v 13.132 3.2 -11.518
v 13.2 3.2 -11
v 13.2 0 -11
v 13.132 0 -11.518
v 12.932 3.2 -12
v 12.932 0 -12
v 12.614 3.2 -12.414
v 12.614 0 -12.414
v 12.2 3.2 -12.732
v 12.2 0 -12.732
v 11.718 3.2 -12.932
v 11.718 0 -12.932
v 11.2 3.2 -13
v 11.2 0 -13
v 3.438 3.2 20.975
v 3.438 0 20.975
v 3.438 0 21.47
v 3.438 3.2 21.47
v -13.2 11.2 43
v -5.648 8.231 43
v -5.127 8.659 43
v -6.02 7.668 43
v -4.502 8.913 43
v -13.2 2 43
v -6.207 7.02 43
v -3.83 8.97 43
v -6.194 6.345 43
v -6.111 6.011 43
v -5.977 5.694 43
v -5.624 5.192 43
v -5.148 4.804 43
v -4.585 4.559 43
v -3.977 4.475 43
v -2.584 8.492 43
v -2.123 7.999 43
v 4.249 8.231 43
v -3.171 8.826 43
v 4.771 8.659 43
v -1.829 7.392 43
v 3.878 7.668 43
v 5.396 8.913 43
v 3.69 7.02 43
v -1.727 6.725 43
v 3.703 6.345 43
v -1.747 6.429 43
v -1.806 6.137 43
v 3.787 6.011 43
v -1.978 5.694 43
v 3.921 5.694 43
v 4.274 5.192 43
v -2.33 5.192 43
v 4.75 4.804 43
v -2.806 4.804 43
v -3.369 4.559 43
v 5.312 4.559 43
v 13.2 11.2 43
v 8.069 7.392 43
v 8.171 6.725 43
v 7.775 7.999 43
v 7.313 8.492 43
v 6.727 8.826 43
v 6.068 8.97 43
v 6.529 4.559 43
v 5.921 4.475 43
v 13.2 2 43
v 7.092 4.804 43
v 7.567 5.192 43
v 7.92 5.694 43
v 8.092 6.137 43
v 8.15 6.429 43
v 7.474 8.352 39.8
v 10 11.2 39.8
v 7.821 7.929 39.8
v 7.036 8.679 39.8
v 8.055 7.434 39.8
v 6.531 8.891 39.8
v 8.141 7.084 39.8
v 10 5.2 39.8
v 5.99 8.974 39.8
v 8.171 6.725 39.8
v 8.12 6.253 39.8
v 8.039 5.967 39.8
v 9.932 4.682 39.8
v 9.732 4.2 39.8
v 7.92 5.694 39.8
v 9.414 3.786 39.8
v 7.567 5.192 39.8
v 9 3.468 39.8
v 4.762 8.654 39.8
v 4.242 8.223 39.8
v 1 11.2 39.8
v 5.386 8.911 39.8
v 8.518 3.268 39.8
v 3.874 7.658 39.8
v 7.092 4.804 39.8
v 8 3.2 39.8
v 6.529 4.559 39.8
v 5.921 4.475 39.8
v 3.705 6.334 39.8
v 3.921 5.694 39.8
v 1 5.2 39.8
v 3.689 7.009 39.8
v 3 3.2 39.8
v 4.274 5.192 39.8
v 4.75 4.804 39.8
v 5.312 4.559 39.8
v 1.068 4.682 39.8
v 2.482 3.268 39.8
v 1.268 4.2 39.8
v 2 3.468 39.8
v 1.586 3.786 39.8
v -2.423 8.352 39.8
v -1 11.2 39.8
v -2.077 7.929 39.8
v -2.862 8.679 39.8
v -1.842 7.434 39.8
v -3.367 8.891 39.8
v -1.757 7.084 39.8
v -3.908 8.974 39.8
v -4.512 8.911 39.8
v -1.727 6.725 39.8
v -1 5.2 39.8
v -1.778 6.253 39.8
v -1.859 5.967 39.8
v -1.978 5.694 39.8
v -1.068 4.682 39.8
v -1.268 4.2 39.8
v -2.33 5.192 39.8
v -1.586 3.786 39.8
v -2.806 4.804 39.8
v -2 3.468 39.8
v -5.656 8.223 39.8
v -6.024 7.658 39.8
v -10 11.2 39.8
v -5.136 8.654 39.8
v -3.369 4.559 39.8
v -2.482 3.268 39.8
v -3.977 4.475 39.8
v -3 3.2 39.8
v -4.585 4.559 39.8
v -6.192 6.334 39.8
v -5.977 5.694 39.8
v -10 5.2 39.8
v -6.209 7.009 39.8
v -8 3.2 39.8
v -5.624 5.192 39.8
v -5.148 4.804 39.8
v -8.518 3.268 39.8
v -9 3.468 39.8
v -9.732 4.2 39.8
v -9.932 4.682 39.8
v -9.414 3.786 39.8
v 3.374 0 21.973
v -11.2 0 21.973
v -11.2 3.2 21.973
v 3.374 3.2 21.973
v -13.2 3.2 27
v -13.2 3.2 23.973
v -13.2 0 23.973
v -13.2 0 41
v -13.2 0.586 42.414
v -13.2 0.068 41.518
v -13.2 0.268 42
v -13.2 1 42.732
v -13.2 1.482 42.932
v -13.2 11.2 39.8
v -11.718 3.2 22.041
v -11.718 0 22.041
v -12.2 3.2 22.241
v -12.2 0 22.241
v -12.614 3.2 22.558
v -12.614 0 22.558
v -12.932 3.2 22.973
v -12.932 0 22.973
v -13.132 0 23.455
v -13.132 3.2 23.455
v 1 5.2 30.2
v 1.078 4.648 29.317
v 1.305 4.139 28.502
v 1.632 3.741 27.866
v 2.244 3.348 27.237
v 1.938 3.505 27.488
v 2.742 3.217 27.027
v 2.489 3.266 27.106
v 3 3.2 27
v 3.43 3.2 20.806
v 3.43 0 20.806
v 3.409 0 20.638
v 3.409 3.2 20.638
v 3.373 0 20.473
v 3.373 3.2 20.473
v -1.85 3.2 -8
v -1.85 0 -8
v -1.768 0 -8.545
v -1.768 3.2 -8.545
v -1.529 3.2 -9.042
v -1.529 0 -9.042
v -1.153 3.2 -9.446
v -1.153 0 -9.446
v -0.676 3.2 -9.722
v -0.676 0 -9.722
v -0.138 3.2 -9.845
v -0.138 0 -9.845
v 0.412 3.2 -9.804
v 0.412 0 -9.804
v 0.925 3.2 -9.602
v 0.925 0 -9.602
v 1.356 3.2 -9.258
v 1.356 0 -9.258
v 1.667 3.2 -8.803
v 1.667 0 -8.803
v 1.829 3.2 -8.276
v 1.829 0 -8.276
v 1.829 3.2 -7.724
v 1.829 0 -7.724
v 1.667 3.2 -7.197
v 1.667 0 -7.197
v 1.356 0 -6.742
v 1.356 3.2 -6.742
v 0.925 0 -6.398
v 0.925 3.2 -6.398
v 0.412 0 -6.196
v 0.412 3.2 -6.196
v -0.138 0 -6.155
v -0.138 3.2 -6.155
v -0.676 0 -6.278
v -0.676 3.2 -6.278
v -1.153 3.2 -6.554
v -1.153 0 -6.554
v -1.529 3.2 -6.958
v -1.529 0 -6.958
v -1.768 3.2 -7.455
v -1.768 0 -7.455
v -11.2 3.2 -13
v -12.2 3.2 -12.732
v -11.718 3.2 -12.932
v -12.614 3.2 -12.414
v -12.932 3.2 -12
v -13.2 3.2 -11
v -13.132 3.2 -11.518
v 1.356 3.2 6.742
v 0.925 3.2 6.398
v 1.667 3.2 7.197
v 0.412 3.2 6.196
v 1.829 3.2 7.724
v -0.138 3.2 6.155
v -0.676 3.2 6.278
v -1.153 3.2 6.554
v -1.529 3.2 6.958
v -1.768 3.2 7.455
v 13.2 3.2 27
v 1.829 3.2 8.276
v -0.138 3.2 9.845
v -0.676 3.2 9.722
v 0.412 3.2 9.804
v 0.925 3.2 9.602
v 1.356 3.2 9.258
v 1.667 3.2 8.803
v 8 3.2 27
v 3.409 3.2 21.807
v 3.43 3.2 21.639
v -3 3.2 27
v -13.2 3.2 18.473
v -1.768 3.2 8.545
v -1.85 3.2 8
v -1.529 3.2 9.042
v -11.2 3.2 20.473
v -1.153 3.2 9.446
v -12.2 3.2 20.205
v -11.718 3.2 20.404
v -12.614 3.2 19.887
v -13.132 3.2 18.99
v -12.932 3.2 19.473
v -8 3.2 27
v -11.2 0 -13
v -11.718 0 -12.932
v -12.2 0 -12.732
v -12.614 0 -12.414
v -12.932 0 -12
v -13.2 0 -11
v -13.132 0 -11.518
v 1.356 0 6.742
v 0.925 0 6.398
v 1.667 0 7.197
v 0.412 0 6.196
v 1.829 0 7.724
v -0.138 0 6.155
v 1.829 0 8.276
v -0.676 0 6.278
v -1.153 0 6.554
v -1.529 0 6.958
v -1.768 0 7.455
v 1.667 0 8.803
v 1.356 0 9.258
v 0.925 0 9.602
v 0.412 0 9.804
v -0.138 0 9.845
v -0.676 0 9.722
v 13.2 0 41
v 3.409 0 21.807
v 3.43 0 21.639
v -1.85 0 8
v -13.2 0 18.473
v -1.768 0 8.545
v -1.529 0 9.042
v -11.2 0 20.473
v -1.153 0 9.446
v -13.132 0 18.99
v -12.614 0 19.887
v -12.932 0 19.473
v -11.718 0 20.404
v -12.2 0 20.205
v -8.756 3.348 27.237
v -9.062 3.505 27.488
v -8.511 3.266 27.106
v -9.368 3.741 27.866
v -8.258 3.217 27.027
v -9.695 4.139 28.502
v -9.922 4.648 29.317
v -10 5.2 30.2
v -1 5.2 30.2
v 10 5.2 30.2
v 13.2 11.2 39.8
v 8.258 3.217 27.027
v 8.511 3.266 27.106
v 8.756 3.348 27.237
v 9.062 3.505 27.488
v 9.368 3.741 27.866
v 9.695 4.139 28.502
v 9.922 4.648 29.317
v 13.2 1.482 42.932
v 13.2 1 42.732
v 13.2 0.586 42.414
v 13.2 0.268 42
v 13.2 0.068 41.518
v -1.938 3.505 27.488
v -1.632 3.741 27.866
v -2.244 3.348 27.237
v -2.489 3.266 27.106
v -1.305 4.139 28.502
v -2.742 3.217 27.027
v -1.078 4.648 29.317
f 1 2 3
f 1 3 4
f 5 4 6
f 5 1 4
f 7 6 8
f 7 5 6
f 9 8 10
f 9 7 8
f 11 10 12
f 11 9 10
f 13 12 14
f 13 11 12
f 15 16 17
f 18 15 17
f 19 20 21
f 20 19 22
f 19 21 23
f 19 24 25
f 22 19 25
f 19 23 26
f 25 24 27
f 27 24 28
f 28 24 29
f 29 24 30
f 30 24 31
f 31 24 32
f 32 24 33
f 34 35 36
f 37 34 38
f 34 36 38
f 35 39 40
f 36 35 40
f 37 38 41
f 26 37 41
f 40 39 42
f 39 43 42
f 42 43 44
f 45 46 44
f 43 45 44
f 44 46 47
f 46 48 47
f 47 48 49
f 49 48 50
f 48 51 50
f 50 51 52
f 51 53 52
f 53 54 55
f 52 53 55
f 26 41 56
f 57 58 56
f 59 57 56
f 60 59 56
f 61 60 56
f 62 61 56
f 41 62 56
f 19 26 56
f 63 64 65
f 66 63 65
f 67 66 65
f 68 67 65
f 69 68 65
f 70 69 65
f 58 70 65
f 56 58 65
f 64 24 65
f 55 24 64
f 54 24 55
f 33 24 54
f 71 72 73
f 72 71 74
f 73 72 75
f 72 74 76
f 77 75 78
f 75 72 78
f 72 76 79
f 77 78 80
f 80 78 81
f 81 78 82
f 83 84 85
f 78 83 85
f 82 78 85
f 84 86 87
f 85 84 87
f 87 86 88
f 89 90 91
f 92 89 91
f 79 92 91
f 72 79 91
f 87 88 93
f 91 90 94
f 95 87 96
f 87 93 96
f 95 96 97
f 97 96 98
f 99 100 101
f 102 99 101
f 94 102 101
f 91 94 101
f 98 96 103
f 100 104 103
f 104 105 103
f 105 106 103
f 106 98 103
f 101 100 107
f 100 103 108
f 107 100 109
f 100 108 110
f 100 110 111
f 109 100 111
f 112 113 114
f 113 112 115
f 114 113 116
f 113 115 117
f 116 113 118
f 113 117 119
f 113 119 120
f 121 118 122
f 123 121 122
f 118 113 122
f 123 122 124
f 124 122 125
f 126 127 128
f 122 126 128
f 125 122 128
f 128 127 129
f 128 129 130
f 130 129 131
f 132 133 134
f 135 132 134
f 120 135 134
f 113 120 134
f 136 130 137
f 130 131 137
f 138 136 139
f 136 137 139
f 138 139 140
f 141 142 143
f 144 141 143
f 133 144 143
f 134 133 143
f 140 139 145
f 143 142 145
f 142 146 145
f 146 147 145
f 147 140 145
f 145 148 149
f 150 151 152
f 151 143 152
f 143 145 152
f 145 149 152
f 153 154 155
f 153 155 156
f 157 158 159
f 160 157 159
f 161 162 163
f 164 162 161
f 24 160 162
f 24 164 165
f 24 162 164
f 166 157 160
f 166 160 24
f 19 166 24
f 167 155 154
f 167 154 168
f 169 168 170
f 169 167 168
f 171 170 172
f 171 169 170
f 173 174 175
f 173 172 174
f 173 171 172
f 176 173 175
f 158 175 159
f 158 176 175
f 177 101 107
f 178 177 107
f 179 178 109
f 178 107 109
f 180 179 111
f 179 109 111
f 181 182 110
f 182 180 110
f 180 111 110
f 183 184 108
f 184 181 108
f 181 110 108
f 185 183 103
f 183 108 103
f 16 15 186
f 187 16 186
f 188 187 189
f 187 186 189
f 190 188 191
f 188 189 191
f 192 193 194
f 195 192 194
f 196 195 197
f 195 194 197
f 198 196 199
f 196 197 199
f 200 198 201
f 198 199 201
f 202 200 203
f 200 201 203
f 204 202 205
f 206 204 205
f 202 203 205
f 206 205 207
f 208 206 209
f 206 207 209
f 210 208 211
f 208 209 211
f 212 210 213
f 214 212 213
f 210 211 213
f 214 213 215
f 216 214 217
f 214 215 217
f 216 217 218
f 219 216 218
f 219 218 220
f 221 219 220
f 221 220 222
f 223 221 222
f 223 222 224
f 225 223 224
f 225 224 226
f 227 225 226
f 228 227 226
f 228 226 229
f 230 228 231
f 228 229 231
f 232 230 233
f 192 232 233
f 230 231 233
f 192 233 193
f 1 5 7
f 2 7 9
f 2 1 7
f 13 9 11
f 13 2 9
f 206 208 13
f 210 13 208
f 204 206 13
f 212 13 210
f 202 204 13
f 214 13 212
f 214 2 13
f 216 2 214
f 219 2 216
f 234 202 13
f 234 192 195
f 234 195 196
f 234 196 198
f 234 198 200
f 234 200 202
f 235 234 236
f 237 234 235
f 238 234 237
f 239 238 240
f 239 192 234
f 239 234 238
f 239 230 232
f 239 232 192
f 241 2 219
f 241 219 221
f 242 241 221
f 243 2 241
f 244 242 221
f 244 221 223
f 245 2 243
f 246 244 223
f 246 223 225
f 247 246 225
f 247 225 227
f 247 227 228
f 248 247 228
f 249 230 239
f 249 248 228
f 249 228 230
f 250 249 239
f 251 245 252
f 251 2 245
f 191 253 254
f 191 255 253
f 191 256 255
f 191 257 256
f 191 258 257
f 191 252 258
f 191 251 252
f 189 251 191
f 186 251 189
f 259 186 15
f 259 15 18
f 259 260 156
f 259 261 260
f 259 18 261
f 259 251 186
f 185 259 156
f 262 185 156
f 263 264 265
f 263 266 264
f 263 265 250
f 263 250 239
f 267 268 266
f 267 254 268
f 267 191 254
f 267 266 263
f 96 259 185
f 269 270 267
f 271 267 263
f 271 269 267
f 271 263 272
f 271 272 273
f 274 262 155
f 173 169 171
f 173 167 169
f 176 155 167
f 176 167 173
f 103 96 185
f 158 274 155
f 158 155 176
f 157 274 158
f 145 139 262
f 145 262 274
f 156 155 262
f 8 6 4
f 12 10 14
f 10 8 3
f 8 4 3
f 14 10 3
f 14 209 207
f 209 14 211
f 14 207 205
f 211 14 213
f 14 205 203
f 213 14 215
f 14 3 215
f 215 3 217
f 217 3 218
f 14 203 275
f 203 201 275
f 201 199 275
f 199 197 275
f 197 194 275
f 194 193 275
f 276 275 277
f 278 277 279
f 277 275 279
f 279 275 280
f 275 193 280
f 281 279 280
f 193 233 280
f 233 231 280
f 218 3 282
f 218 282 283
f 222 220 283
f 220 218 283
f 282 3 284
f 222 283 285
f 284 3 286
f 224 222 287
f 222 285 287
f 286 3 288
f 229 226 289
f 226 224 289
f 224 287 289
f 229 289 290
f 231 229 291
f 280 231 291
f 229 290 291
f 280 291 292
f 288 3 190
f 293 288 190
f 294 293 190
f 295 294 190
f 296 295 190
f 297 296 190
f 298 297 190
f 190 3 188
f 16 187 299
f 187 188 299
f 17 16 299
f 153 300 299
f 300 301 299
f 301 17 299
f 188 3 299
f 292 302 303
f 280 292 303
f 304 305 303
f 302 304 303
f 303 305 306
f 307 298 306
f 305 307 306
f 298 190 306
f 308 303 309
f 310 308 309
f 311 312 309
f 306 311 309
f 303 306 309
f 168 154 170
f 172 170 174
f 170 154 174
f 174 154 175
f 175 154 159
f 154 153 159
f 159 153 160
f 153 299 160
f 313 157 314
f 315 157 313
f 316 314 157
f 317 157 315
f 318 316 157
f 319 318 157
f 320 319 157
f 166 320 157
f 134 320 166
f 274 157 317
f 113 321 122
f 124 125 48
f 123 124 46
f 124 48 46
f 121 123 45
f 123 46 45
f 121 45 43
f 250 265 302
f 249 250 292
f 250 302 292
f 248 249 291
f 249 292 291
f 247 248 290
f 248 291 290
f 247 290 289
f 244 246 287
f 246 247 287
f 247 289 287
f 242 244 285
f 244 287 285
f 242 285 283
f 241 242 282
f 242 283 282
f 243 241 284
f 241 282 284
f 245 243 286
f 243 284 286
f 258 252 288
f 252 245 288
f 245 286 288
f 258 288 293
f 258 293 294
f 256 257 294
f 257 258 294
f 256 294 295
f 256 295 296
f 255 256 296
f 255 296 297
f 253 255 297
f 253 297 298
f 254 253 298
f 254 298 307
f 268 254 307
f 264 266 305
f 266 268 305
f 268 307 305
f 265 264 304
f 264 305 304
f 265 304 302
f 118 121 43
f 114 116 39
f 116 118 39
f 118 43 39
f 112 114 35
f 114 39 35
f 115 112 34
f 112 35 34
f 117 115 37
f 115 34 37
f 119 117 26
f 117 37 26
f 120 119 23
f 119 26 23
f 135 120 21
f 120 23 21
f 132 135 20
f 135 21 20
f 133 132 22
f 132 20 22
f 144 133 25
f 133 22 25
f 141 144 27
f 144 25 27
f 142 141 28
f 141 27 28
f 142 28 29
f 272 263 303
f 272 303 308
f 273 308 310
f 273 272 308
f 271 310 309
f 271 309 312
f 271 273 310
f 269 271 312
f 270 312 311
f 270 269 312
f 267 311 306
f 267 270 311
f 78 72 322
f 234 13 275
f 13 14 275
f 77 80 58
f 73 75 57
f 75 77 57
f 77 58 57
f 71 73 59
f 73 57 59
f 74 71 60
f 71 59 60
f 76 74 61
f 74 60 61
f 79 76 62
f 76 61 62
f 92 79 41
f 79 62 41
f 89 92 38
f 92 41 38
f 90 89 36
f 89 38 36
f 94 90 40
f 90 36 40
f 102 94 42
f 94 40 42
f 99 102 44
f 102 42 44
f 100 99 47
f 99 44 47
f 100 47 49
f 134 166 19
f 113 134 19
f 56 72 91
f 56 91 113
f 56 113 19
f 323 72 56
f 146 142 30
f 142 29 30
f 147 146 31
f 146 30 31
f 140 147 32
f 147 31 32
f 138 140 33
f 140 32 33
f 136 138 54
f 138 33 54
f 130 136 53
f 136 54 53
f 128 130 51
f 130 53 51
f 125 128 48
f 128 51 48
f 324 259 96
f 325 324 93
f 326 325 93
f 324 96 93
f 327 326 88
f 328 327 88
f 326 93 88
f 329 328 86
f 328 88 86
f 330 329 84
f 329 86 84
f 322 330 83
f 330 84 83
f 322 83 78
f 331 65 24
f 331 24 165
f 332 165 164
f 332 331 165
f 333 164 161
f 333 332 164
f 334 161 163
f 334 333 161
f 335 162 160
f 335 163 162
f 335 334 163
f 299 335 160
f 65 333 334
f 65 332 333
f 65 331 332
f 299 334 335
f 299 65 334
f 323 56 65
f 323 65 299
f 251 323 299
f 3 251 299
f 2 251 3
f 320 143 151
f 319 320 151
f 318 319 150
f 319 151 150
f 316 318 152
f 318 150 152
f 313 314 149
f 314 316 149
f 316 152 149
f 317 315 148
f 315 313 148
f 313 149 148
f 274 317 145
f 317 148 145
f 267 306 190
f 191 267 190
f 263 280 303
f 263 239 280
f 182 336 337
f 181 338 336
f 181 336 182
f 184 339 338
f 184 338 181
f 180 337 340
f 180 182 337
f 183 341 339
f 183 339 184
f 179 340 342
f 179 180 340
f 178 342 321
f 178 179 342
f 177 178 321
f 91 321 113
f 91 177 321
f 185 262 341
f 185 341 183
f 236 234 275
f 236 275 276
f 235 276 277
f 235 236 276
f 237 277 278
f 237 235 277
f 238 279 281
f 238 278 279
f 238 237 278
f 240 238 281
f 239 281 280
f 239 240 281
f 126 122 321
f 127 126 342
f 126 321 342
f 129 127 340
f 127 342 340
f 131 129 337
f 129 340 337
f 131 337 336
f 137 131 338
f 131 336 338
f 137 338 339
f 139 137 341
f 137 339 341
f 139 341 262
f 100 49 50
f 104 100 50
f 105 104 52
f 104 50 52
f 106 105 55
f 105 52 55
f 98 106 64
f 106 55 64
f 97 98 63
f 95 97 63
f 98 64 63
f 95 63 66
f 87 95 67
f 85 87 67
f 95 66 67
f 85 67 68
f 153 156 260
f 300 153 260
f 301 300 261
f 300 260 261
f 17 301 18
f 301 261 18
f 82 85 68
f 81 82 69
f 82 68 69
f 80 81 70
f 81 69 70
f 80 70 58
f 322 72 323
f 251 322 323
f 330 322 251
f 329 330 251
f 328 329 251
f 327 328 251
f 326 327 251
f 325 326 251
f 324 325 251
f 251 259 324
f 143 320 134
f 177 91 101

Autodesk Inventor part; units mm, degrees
ref_plane "YZ Plane" through (0, 0, 0) normal (1, 0, 0) x (0, 1, 0)
ref_plane "XZ Plane" through (0, 0, 0) normal (0, 1, 0) x (-1, 0, 0)
ref_plane "XY Plane" through (0, 0, 0) normal (0, 0, 1) x (1, 0, 0)
sketch "Эскиз1" plane through (0, 0, 0) normal (0, 1, 0) x (-1, 0, 0)
  circle A0 centre (0, 8) radius 1.85
  circle A1 centre (0, -8) radius 1.85
  line L0 (0, -8) -> (0, -13)
  line L1 (0, -13) -> (5, -13)
  line L2 (5, -13) -> (5, 43)
  line L3 (5, 43) -> (0, 43)
  line L4 (0, 43) -> (0, -13)
  line L5 (0, -13) -> (-5, -13)
  line L6 (-5, -13) -> (-5, 43)
  line L7 (-5, 43) -> (0, 43)
  line L8 (5, -13) -> (10, -13)
  line L9 (10, -13) -> (10, 43)
  line L10 (10, 43) -> (5, 43)
  line L11 (5, 43) -> (5, -13)
  line L12 (-5, -13) -> (-10, -13)
  line L13 (-10, -13) -> (-10, 43)
  line L14 (-10, 43) -> (-5, 43)
  line L15 (-5, 43) -> (-5, -13)
  point P0 (0, 0)
  dimension "d0" = 5
  dimension "d2" = 56
extrude "Выдавливание1" add sketch "Эскиз1" along normal blind 3.2 contours A0 L4 L3 L2 L1 L0 A1 | A0 L4 A1 L0 L5 L6 L7 | L10 L9 L8 L2 | L6 L12 L13 L14
sketch "Эскиз2" plane through (0, 0, 0) normal (0, -1, 0) x (1, 0, 0)
  line L0 (-10, 43) -> (10, 43) projected
  line L1 (-10, 43) -> (10, 43)
  line L2 (10, 43) -> (10, 39.8)
  line L3 (10, 39.8) -> (-10, 39.8)
  line L4 (-10, 39.8) -> (-10, 43)
  point P0 (0, 0)
  dimension "d9" = 20
  dimension "d10" = 3.2
extrude "Выдавливание2" add sketch "Эскиз2" against normal blind 10
sketch "Эскиз3" plane through (0, 10, 0) normal (0, 1, 0) x (1, 0, 0)
  line L0 (10, -39.8) -> (-10, -39.8) projected
  line L1 (-10, -39.8) -> (-10, -43) projected
  line L2 (-10, -43) -> (10, -43) projected
  line L3 (10, -43) -> (10, -39.8) projected
  point P0 (0, 0)
extrude "Выдавливание3" add sketch "Эскиз3" along normal blind 1.2
sketch "Эскиз4" plane through (-10, 0, 43) normal (0, 0, 1) x (1, 0, 0)
  point P0 (10, 0)
sketch "Эскиз5" plane through (-10, 0, 43) normal (0, 0, 1) x (1, 0, 0)
  ellipse E0 centre (6.0228, 6.7252) end of major axis (6.0228, 4.4752) minor radius 2.2495 (8.0223, 5.6944) -> (4.0232, 5.6944) ccw projected
  ellipse E1 centre (15.9206, 6.7252) end of major axis (15.9206, 8.9752) minor radius 2.2495 (17.9202, 5.6944) -> (13.921, 5.6944) ccw projected
  circle A0 centre (6.0228, 6.7252) radius 2.25
  circle A1 centre (15.9206, 6.7252) radius 2.25
  point P0 (10, 0)
  point P1 (15.9206, 8.9752)
  point P2 (15.9696, 8.975)
  point P3 (6.0719, 8.975)
  point P4 (6.0228, 8.9752)
extrude "Выдавливание4" cut sketch "Эскиз5" against normal through all
sketch "Эскиз6" plane through (10, 0, 43) normal (1, 0, 0) x (0, 0, -1)
  line L0 (0, 0) -> (56, 0) projected
  line L1 (56, 0) -> (56, 3.2) projected
  line L2 (3.2, 3.2) -> (56, 3.2) projected
  line L3 (3.2, 3.2) -> (3.2, 11.2) projected
  line L4 (0, 11.2) -> (3.2, 11.2) projected
  line L5 (0, 0) -> (0, 11.2) projected
  line L6 (3.2, 11.2) -> (16, 3.2)
  point P0 (43, 0)
extrude "Выдавливание5" add sketch "Эскиз6" along normal blind 3.2
sketch "Эскиз7" plane through (-10, 0, -13) normal (-1, 0, 0) x (0, 0, 1)
  line L0 (52.8, 3.2) -> (52.8, 11.2) projected
  line L1 (40, 3.2) -> (52.8, 11.2) projected
  line L2 (52.8, 3.2) -> (40, 3.2) projected
  line L3 (0, 3.2) -> (52.8, 3.2) projected
  line L4 (0, 0) -> (0, 3.2) projected
  line L5 (0, 0) -> (56, 0) projected
  line L6 (56, 0) -> (56, 11.2) projected
  line L7 (52.8, 11.2) -> (56, 11.2) projected
  line L8 (52.8, 3.2) -> (52.8, 11.2) projected
  point P0 (13, 0)
extrude "Выдавливание6" add sketch "Эскиз7" along normal blind 3.2
ref_plane "РабПлоскость1" through (0, 0, -13) normal (1, 0, 0) x (0, 0, -1)
sketch "Эскиз8" plane through (0, 0, -13) normal (1, 0, 0) x (0, 0, -1)
  line L0 (-40, 3.2) -> (-52.8, 3.2) projected
  line L1 (-52.8, 11.2) -> (-40, 3.2) projected
  line L2 (-52.8, 3.2) -> (-52.8, 11.2) projected
  point P0 (-13, 0)
extrude "Выдавливание7" add sketch "Эскиз8" along normal blind 1
sketch "Эскиз9" plane through (0, 0, -13) normal (-1, 0, 0) x (0, 0, 1)
  line L0 (52.8, 11.2) -> (52.8, 3.2) projected
  line L1 (40, 3.2) -> (52.8, 11.2) projected
  line L2 (52.8, 3.2) -> (40, 3.2) projected
  point P0 (13, 0)
extrude "Выдавливание8" add sketch "Эскиз9" along normal blind 1
fillet "Сопряжение1" radius 2 4 edges at (10, 3.2, 33.4) (-10, 3.2, 33.4) (1, 3.2, 33.4) (-1, 3.2, 33.4)
sketch "Эскиз10" plane through (0, 0, 0) normal (0, -1, 0) x (1, 0, 0)
  line L0 (-3.0752, 19.5502) -> (-3.0021, 23.0495) projected
  arc A0 (3.9956, 22.9433) -> (3.5069, 23.4136) centre (3.4965, 22.9137) ccw projected
  line L1 (9.496, 22.8284) -> (3.9956, 22.9433) projected
  line L2 (9.9129, 42.784) -> (9.496, 22.8284) projected
  line L3 (-8.0832, 43.16) -> (9.9129, 42.784) projected
  line L4 (-8.0832, 43.16) -> (-8.5001, 23.2044) projected
  line L5 (-2.9997, 23.0894) -> (-8.5001, 23.2044) projected
  arc A1 (-2.4918, 23.5389) -> (-2.9997, 23.0894) centre (-2.5022, 23.039) ccw projected
  line L6 (-2.4918, 23.5389) -> (3.5069, 23.4136) projected
  line L7 (-3.0752, 19.5502) -> (-3.0021, 23.0495) projected
  line L8 (-8.5009, 23.1644) -> (-3.0021, 23.0495) projected
  line L9 (-8.584, 19.1852) -> (-8.5009, 23.1644) projected
  line L10 (-2.7253, 19.0628) -> (-8.584, 19.1852) projected
  arc A2 (-3.0752, 19.5502) -> (-2.7253, 19.0628) centre (-2.5753, 19.5398) ccw projected
  arc A3 (3.5533, 18.9317) -> (3.9233, 19.404) centre (3.4234, 19.4145) ccw projected
  line L11 (9.412, 18.8093) -> (3.5533, 18.9317) projected
  line L12 (9.412, 18.8093) -> (9.4952, 22.7884) projected
  line L13 (3.9964, 22.9033) -> (9.4952, 22.7884) projected
  line L14 (3.9964, 22.9033) -> (3.9233, 19.404) projected
  line L15 (-8.0067, 17.5728) -> (-4.9183, 17.5083) projected
  line L16 (-4.9183, 17.5083) -> (-4.9475, 16.1086) projected
  line L17 (-4.9475, 16.1086) -> (5.6502, 15.8872) projected
  line L18 (5.6502, 15.8872) -> (5.6794, 17.2869) projected
  line L19 (5.6794, 17.2869) -> (8.7679, 17.2224) projected
  line L20 (9.4912, 18.8003) -> (8.7679, 17.2224) projected
  ellipse E0 centre (9.3638, 16.5021) end of major axis (9.412, 18.8093) minor radius 1 (9.4912, 18.8003) -> (9.412, 18.8093) ccw projected
  line L21 (9.412, 18.8093) -> (3.5533, 18.9317) projected
  line L22 (3.5533, 18.9317) -> (-2.7253, 19.0628) projected
  line L23 (-2.7253, 19.0628) -> (-8.584, 19.1852) projected
  ellipse E1 centre (-8.6322, 16.878) end of major axis (-8.584, 19.1852) minor radius 1 (-8.584, 19.1852) -> (-8.6635, 19.1796) ccw projected
  line L24 (-8.0067, 17.5728) -> (-8.6635, 19.1796) projected
  line L25 (3.4376, 23.4704) -> (-15, 23.4704)
  line L26 (-15, 23.4704) -> (-15, 18.9749)
  line L27 (-15, 18.9749) -> (3.4376, 18.9749)
  line L28 (3.4376, 18.9749) -> (3.4376, 23.4704)
  point P0 (0, 0)
extrude "Выдавливание9" cut sketch "Эскиз10" against normal through all contours A2 L10 L9 L8 L0 | L0 L8 L9 E1 L24 L27 L26 L25 L4 L5 A1 L6 L28 L22 A2 | L22 L27 L24 E1 L10 | L6 L25 L28 | L25 A1 L5 L4
fillet "Сопряжение2" radius 2 2 edges at (3.4376, 1.6, 23.4704) (3.4376, 1.6, 18.9749)
fillet "Сопряжение3" radius 2 4 edges at (13.2, 1.6, -13) (-13.2, 1.6, -13) (-13.2, 1.6, 23.4704) (-13.2, 1.6, 18.9749)
fillet "Сопряжение4" radius 2 1 edges at (0, 0, 43)
sketch "Эскиз11" plane through (0, 0, 0) normal (0, -1, 0) x (1, 0, 0)
  line L0 (3.4376, 21.4704) -> (3.4376, 20.9749) projected
  line L1 (3.4376, 21.2226) -> (-14.4424, 21.2226)
  line L2 (3.4376, 21.2226) -> (-13.5624, 21.2226)
  line L3 (-13.5624, 21.2226) -> (-13.5624, 21.9726)
  line L4 (-13.5624, 21.9726) -> (3.4376, 21.9726)
  line L5 (3.4376, 21.9726) -> (3.4376, 21.2226)
  line L6 (-13.5624, 21.2226) -> (-13.5624, 20.4726)
  line L7 (-13.5624, 20.4726) -> (3.4376, 20.4726)
  line L8 (3.4376, 20.4726) -> (3.4376, 21.2226)
  circle A0 centre (0, -8) radius 1.85 projected
  circle A1 centre (0, 8) radius 1.85 projected
  line L9 (-13.2, 41) -> (13.2, 41) projected
  line L10 (-13.2, 25.4704) -> (-13.2, 41) projected
  arc A2 (-13.2, 25.4704) -> (-11.2, 23.4704) centre (-11.2, 25.4704) ccw projected
  line L11 (-11.2, 23.4704) -> (1.4376, 23.4704) projected
  arc A3 (3.4376, 21.4704) -> (1.4376, 23.4704) centre (1.4376, 21.4704) ccw projected
  line L12 (3.4376, 21.4704) -> (3.4376, 20.9749) projected
  arc A4 (1.4376, 18.9749) -> (3.4376, 20.9749) centre (1.4376, 20.9749) ccw projected
  line L13 (1.4376, 18.9749) -> (-11.2, 18.9749) projected
  arc A5 (-11.2, 18.9749) -> (-13.2, 16.9749) centre (-11.2, 16.9749) ccw projected
  line L14 (-13.2, -11) -> (-13.2, 16.9749) projected
  arc A6 (-13.2, -11) -> (-11.2, -13) centre (-11.2, -11) ccw projected
  line L15 (-11.2, -13) -> (11.2, -13) projected
  arc A7 (11.2, -13) -> (13.2, -11) centre (11.2, -11) ccw projected
  line L16 (13.2, 41) -> (13.2, -11) projected
  line L17 (-13.2, 16.9749) -> (-13.2, -11) projected
  line L18 (-13.2, 25.4704) -> (-13.2, 16.9749)
  point P0 (0, 0)
  point P1 (-13.2, 21.9726)
  point P2 (3.3735, 21.9726)
  point P3 (3.3735, 20.4726)
  point P4 (-13.2, 20.4726)
  dimension "d30" = 17
  dimension "d31" = 0.75
extrude "Выдавливание10" add sketch "Эскиз11" against normal up to surface (3.2 mm away) contours L4 L18 A2 L11 A3 | A4 L13 A5 L18 L7
fillet "Сопряжение5" radius 2 2 edges at (-13.2, 1.6, 20.4726) (-13.2, 1.6, 21.9726)
properties part number "для захвата"
